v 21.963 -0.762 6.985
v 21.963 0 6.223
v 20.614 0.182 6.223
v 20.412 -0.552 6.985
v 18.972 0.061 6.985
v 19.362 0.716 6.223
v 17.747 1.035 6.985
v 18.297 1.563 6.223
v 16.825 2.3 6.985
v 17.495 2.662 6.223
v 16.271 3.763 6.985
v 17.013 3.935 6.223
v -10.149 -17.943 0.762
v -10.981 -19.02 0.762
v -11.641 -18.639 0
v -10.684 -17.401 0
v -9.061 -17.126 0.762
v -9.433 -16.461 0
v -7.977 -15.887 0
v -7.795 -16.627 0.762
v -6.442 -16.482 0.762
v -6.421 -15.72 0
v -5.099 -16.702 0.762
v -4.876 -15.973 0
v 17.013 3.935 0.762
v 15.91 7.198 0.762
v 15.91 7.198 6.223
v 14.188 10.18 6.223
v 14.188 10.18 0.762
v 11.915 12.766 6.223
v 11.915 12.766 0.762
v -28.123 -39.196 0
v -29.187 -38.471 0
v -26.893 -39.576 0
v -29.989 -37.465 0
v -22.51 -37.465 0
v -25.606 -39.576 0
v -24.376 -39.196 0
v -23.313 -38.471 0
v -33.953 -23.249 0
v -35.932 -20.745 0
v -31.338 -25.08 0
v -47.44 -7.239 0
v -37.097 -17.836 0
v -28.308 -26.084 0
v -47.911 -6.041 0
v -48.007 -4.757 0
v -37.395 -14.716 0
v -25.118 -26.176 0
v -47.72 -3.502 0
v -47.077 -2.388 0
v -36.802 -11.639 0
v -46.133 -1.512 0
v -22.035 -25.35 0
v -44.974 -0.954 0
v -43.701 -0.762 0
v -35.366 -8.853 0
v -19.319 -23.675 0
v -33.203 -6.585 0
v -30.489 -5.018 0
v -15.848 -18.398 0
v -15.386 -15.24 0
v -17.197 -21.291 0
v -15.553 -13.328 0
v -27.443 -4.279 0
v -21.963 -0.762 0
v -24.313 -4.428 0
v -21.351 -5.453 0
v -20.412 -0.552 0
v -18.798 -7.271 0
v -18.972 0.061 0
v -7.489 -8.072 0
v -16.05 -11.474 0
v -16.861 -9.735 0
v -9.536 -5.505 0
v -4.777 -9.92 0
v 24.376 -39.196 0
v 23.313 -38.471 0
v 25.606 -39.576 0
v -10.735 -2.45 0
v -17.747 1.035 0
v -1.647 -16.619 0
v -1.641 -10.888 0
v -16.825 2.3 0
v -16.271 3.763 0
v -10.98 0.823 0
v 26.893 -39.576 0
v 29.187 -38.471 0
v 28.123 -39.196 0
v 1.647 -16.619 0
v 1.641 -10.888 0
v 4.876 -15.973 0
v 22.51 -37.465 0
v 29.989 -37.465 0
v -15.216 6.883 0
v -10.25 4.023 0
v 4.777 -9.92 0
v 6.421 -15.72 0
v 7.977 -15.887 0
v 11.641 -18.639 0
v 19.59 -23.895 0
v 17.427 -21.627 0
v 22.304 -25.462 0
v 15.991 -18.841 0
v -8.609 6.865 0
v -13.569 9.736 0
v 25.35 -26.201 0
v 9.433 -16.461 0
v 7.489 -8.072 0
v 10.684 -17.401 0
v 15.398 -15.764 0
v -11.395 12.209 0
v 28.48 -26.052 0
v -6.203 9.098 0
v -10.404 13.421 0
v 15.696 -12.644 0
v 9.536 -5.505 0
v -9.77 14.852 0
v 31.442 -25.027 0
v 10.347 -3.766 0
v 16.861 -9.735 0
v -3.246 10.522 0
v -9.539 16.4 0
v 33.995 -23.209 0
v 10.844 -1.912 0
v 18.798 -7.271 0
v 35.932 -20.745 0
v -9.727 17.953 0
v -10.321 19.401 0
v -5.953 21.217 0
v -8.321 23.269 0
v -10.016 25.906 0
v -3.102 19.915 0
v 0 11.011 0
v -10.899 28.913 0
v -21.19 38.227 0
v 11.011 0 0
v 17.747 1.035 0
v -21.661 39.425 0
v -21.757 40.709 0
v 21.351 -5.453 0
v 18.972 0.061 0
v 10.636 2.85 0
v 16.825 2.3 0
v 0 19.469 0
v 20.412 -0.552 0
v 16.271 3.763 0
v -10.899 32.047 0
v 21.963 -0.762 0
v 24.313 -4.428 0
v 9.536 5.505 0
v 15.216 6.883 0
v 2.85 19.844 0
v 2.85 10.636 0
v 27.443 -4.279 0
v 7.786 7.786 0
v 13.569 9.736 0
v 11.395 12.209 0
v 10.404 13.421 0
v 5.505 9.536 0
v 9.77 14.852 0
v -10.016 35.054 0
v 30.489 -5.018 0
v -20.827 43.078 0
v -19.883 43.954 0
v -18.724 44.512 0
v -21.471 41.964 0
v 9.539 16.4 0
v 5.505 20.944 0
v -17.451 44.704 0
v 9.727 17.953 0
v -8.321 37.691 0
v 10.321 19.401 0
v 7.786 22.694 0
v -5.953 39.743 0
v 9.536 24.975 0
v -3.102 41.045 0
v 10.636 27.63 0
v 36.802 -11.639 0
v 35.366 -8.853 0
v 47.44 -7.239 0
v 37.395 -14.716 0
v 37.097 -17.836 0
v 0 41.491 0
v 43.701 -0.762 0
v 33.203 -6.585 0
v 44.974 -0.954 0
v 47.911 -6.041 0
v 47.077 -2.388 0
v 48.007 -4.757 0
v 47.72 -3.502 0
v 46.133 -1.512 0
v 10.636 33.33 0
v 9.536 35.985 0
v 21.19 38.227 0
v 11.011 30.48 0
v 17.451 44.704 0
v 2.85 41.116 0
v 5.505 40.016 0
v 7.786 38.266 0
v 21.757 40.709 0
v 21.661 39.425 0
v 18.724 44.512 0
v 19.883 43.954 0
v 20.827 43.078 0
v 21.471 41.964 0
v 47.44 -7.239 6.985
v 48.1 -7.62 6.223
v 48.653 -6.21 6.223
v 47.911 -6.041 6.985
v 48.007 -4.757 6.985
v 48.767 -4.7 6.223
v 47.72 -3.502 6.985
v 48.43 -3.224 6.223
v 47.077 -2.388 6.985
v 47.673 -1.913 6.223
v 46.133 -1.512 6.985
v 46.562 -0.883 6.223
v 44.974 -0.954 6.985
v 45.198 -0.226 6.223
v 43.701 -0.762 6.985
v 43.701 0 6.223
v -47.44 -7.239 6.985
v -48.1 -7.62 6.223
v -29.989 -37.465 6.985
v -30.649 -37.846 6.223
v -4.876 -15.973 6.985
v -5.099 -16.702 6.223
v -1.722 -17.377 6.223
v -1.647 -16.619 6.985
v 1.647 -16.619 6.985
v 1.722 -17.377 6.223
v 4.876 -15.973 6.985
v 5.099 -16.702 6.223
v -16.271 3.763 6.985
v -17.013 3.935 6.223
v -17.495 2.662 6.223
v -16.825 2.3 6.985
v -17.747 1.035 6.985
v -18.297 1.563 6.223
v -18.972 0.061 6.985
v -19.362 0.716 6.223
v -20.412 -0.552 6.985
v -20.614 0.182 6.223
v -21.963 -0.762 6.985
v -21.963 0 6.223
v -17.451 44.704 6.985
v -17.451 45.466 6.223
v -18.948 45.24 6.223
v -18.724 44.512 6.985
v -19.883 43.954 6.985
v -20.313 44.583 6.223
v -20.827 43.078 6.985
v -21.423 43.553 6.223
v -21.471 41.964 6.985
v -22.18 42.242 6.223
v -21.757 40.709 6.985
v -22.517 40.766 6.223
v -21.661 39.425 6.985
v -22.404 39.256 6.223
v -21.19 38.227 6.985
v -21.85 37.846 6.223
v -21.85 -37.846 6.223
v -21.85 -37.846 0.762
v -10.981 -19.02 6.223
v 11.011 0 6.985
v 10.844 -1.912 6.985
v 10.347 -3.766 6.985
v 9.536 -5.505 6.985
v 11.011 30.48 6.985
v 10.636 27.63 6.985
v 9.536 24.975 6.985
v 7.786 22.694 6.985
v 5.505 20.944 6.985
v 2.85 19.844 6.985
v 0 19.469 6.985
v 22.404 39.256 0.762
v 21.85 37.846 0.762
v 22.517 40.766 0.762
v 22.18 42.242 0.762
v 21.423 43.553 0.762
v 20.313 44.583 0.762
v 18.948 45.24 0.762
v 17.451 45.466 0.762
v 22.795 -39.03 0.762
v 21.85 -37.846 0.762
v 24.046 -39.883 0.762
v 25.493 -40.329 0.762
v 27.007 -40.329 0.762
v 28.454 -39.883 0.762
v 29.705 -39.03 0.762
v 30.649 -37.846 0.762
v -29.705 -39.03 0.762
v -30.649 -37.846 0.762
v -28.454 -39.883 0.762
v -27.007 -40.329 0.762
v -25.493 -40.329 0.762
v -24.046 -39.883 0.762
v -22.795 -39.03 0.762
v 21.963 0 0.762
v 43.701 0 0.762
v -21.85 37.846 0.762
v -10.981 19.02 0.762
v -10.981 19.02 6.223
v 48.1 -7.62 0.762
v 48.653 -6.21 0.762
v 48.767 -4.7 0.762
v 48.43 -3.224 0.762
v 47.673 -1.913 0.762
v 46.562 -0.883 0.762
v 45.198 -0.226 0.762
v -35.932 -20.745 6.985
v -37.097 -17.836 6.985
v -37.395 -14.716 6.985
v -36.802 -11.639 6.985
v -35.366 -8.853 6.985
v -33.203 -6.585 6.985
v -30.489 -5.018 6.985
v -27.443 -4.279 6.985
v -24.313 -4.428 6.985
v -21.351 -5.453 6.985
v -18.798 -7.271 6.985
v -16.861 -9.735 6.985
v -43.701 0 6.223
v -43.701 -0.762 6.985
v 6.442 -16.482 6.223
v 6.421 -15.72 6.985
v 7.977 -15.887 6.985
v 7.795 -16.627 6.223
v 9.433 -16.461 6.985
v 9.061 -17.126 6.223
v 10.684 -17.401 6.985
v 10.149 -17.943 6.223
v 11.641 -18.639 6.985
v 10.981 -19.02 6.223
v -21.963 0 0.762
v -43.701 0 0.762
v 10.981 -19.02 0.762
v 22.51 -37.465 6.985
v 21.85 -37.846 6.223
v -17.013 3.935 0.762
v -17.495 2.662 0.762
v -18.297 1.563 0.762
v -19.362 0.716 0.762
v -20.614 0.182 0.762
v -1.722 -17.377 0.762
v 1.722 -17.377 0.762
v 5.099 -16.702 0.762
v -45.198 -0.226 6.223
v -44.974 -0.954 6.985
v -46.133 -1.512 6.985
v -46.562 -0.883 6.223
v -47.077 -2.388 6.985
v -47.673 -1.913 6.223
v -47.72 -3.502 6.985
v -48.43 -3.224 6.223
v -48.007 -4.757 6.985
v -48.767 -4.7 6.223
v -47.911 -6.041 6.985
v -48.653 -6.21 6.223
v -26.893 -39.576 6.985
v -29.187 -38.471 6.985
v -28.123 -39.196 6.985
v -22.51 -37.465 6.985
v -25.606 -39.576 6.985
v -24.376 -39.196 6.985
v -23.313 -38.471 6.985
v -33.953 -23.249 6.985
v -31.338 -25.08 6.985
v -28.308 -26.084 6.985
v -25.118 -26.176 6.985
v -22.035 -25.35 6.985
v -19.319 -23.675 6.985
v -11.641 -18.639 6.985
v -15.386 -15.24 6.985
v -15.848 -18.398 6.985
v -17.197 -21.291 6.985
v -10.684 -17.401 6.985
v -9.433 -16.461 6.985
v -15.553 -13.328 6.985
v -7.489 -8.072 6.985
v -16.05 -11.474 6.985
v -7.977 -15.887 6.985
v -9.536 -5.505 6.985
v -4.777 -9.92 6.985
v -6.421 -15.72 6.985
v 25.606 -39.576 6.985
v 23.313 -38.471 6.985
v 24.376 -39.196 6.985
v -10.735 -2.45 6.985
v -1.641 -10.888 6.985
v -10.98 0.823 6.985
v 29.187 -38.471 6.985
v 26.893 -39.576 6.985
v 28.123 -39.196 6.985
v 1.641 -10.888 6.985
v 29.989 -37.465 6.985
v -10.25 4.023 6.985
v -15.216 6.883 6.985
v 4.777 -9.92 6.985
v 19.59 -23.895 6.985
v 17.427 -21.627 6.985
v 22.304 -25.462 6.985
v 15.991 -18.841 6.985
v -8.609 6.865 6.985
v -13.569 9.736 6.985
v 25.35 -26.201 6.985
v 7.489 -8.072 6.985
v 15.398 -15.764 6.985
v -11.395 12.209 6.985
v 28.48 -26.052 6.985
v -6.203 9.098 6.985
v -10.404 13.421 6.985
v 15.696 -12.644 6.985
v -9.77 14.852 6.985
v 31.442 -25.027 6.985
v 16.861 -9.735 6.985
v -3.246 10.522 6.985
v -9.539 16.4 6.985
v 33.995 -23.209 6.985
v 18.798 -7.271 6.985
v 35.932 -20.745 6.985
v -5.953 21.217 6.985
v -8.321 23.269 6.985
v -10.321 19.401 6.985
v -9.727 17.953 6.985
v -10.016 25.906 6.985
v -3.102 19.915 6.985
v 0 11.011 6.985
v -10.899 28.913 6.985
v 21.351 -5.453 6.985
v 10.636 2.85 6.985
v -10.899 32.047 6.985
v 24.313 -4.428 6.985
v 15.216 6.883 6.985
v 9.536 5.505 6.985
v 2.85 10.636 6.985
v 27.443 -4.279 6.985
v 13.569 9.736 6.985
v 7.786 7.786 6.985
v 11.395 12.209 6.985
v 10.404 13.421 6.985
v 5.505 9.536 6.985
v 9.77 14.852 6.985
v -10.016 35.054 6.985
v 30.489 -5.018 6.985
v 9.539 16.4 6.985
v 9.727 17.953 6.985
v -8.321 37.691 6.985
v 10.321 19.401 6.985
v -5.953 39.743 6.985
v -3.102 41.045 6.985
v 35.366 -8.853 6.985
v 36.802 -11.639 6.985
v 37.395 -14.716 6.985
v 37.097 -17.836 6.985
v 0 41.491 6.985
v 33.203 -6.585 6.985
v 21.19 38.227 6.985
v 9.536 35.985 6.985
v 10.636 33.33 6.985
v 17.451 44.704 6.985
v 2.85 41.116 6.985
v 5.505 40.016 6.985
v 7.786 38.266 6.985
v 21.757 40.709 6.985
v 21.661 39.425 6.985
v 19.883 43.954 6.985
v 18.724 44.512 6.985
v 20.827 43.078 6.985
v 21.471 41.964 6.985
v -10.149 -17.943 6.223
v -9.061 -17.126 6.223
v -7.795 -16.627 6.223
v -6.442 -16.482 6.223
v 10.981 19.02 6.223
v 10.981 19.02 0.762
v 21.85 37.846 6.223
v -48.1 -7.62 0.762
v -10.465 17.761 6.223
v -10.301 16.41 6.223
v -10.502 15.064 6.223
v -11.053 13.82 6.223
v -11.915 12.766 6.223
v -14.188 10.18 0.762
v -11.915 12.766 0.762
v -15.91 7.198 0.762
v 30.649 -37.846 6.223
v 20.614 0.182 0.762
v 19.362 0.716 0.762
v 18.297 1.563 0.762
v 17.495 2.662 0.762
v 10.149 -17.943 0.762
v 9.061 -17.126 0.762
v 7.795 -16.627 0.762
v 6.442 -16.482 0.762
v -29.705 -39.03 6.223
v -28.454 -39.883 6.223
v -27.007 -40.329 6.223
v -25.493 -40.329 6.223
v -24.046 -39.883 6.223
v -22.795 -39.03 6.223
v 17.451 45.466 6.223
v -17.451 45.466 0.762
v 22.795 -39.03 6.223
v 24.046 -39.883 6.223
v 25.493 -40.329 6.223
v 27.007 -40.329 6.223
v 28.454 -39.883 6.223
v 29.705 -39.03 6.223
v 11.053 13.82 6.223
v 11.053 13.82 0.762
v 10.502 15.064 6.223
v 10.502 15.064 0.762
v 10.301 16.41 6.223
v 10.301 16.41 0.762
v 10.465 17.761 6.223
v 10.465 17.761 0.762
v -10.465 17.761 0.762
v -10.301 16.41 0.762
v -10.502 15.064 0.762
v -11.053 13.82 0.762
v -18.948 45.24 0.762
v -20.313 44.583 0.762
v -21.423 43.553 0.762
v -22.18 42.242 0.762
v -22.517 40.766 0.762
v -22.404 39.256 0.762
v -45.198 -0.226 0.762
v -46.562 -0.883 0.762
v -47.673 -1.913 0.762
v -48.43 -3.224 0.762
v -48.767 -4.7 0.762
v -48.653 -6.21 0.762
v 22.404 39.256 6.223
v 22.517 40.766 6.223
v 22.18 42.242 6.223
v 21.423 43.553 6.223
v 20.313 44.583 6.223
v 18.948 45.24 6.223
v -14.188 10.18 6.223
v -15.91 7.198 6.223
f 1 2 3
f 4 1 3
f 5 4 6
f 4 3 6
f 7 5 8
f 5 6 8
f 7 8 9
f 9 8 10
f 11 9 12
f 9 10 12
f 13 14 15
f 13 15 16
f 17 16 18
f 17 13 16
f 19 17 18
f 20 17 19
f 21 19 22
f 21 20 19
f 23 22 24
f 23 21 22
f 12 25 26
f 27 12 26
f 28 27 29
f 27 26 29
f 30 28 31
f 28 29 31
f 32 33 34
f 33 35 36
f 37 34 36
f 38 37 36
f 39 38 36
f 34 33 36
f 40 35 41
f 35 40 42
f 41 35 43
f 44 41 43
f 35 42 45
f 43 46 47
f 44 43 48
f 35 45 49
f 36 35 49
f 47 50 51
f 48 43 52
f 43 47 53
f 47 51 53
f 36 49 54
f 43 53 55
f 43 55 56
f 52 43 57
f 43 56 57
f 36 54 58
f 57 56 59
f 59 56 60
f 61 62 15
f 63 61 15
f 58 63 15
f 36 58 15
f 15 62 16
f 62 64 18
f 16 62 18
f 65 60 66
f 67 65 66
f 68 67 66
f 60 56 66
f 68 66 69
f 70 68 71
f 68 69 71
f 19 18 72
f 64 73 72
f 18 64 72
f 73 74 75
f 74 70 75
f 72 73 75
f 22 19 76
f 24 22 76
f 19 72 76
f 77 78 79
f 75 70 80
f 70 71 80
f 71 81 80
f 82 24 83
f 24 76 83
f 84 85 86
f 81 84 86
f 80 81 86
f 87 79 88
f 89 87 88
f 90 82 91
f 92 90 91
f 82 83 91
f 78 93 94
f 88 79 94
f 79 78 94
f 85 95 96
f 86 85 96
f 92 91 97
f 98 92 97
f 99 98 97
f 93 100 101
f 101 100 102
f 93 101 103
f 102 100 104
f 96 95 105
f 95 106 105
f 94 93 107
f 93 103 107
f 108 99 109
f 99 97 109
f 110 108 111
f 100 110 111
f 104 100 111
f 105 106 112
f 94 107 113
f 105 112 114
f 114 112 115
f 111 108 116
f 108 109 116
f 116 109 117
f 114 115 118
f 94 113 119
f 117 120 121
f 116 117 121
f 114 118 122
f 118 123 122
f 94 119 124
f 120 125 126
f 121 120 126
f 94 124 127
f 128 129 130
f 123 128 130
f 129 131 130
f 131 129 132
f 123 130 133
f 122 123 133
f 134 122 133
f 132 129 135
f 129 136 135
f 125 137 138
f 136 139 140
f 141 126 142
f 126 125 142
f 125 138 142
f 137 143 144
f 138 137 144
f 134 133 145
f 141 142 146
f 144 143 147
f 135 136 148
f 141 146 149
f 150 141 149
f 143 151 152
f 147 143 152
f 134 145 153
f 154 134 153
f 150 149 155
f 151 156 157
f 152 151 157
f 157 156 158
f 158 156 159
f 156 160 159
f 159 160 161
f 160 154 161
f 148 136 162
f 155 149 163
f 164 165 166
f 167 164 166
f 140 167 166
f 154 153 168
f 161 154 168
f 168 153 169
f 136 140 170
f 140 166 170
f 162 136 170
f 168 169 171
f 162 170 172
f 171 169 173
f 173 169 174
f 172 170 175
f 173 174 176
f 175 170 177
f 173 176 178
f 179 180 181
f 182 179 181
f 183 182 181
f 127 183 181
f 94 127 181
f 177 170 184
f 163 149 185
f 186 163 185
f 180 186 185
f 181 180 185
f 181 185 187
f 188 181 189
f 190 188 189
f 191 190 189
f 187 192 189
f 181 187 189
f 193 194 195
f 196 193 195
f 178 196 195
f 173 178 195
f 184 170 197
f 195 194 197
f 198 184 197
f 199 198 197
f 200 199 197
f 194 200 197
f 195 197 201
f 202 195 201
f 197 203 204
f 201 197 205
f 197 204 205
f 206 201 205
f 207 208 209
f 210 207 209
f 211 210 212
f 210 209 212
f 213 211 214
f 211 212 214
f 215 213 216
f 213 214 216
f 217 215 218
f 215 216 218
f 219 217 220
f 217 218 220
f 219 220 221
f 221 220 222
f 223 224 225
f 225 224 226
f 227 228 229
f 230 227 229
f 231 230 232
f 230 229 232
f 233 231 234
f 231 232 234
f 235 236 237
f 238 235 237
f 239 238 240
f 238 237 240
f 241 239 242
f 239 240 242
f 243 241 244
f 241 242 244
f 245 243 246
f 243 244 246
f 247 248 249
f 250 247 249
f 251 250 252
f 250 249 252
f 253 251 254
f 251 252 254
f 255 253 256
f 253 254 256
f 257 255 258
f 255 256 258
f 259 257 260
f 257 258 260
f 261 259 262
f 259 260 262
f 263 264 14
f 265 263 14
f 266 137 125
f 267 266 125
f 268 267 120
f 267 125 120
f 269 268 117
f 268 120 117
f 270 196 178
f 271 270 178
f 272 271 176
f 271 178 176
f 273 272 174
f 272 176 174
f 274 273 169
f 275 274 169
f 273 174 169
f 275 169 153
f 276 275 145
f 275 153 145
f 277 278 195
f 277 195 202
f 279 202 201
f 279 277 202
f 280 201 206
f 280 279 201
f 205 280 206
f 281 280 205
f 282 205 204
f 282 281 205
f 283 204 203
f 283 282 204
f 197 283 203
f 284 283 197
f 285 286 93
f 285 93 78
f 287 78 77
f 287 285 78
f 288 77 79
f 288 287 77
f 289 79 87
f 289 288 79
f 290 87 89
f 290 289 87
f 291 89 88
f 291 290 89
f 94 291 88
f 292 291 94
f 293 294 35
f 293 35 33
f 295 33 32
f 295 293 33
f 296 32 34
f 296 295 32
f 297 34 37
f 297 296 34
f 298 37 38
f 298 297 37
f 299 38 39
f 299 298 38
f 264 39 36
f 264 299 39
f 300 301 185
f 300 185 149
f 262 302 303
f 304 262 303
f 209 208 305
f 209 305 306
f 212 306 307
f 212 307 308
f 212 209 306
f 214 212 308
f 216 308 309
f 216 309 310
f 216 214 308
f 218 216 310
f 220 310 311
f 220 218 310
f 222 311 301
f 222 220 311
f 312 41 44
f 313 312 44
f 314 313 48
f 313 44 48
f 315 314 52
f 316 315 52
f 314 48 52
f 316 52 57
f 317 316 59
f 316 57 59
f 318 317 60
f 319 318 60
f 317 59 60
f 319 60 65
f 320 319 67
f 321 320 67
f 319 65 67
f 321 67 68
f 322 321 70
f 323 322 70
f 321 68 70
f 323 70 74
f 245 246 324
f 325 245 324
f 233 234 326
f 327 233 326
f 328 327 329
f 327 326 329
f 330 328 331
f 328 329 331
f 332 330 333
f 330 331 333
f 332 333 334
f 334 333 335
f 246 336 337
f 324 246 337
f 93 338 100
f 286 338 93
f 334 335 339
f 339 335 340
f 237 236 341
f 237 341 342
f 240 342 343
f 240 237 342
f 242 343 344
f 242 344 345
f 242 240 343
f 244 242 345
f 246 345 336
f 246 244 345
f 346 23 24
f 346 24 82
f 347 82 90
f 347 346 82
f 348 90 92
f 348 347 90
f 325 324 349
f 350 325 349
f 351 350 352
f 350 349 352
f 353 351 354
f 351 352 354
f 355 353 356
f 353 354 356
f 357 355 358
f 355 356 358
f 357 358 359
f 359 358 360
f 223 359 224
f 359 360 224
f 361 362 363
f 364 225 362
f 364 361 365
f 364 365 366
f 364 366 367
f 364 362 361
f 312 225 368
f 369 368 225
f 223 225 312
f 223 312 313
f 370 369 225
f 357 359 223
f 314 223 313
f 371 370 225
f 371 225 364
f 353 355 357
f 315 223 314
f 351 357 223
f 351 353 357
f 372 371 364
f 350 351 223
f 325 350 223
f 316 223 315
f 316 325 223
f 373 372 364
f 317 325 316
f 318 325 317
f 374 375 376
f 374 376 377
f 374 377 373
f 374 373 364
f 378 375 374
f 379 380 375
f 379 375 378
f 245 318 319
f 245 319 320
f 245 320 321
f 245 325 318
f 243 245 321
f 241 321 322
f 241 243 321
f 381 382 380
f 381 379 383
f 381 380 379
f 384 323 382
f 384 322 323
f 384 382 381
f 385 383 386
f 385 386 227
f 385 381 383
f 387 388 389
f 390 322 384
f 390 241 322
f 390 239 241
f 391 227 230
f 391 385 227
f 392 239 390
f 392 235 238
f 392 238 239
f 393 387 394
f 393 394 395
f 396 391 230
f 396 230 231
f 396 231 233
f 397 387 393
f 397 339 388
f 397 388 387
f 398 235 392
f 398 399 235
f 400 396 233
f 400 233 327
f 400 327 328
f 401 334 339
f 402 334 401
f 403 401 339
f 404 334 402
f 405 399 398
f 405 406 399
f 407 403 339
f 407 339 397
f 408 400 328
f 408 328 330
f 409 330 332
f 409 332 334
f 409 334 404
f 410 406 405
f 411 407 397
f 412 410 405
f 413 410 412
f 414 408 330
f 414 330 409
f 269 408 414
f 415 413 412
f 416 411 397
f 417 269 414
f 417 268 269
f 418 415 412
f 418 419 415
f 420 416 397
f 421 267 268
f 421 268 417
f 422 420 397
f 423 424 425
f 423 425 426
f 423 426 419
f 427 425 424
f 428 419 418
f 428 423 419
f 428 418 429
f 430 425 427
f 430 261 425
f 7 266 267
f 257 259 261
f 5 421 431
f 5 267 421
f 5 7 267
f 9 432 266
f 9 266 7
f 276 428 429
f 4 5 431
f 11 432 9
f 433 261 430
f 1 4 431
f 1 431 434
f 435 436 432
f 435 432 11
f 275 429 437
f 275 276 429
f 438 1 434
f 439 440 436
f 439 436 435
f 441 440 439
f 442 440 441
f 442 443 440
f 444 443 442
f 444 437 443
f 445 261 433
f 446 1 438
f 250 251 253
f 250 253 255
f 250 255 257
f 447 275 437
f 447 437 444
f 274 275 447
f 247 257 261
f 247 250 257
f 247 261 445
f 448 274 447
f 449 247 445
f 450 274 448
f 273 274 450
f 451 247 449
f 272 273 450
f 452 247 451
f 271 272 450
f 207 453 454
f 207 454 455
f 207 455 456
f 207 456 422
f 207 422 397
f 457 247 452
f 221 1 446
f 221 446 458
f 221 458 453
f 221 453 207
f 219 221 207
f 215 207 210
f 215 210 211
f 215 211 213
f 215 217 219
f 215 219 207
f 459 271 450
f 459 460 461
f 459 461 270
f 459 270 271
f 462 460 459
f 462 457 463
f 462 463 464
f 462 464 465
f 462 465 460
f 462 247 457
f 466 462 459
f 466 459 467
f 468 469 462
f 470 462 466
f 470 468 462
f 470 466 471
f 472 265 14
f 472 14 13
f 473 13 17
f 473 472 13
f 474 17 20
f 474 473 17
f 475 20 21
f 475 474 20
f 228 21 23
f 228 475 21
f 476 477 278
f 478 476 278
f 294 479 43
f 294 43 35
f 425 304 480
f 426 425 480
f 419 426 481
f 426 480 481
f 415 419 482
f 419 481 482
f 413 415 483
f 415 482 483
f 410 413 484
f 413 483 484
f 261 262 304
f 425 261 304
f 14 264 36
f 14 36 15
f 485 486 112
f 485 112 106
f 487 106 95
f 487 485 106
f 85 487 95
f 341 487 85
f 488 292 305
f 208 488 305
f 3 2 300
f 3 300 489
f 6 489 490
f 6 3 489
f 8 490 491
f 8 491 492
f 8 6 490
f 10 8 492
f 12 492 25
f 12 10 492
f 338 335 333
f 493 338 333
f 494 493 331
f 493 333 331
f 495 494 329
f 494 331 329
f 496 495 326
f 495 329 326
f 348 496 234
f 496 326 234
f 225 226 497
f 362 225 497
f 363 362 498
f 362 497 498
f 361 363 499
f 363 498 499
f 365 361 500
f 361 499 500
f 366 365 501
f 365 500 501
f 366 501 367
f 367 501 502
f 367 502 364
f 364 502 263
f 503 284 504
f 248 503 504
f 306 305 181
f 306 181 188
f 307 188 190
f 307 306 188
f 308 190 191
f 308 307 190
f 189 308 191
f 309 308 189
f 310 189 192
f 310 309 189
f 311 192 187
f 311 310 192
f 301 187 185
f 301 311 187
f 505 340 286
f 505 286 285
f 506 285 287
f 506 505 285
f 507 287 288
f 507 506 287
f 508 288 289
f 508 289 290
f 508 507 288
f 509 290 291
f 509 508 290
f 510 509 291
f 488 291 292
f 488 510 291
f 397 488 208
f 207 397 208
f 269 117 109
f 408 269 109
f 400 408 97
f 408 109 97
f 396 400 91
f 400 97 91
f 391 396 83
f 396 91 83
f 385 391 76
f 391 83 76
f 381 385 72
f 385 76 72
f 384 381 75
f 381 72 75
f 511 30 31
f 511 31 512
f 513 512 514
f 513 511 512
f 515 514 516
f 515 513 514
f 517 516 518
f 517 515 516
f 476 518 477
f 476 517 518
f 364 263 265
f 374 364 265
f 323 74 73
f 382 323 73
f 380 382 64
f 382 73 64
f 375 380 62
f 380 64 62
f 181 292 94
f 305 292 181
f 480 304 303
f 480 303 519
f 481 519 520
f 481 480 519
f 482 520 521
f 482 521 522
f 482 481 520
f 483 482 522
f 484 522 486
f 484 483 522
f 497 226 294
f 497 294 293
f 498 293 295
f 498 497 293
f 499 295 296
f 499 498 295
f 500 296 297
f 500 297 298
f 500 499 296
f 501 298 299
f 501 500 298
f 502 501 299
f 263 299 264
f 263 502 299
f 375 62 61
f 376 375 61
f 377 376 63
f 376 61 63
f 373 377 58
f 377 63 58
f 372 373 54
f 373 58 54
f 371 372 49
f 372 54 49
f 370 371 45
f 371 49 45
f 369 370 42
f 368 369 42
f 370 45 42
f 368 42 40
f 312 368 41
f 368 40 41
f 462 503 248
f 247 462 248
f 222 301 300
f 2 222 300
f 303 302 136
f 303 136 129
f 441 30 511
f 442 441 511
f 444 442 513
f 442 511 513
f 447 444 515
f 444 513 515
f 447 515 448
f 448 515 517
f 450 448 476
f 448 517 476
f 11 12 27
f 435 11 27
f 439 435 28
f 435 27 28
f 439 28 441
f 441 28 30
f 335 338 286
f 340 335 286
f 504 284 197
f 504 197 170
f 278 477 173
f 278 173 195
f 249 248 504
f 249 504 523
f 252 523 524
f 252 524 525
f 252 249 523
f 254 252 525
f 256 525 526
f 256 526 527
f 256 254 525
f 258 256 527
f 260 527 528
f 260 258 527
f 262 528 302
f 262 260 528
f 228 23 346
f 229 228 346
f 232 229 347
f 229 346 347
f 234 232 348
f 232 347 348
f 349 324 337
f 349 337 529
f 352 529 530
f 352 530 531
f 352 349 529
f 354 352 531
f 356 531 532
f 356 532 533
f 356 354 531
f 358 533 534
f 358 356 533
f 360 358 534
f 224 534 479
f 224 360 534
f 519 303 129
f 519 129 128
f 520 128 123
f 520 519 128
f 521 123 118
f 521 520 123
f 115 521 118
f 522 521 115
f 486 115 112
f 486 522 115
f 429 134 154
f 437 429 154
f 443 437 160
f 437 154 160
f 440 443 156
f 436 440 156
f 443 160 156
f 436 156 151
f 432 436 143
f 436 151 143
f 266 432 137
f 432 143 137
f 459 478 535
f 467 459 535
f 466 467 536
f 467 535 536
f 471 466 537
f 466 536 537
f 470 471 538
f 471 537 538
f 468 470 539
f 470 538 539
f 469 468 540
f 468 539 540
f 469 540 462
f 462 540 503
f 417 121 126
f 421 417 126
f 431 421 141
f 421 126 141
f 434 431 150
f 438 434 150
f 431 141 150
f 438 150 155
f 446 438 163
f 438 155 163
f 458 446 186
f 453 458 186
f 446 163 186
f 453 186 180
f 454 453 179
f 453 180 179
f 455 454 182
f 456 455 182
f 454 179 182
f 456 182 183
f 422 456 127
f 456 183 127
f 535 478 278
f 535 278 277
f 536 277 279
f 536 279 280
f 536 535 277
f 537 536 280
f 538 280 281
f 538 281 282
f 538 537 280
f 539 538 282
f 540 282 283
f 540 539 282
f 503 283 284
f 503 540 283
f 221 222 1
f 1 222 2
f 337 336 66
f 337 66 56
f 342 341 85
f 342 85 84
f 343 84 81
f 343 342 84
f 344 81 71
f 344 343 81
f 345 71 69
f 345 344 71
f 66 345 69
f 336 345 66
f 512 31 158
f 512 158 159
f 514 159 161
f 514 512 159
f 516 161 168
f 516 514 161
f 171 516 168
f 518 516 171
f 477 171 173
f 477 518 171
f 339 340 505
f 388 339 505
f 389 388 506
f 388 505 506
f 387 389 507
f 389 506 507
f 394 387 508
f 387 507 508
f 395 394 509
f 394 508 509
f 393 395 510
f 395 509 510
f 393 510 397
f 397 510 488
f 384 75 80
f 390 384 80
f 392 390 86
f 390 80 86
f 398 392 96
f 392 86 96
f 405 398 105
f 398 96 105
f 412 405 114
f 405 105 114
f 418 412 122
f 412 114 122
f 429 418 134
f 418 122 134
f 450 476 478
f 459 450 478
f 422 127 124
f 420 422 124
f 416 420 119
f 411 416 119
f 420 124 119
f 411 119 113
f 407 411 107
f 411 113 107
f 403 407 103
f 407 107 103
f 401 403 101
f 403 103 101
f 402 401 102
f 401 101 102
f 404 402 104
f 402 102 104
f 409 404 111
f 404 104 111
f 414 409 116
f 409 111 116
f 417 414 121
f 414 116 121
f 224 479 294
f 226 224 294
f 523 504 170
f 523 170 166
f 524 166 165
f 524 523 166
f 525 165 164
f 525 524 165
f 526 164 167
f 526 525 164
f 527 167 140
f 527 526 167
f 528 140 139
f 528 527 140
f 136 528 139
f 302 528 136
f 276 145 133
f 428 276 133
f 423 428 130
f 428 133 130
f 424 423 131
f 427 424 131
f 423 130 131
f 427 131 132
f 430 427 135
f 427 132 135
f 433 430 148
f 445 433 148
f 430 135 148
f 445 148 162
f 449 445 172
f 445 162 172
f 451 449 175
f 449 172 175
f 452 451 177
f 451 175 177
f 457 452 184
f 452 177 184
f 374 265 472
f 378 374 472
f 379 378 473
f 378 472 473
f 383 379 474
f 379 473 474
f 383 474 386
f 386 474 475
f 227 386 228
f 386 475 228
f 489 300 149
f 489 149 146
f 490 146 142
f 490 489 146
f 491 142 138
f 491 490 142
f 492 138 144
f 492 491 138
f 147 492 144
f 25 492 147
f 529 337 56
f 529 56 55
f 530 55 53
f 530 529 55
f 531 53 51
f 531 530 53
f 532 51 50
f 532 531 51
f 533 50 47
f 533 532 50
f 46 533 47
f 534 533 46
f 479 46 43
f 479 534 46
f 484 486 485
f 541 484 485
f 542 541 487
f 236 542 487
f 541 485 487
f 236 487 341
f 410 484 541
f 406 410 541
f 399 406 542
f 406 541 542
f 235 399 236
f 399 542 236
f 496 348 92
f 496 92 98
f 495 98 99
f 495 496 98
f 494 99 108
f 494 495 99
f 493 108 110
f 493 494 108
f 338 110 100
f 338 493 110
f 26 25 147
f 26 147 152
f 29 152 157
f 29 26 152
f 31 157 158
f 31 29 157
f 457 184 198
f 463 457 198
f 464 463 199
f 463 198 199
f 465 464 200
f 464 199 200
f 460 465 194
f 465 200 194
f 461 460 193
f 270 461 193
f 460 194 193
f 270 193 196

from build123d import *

# Parameters (mm, degrees)
F1_DEPTH = 6.985
F2_R     = 5.08
F3_SIZE  = 0.762


with BuildPart() as f1:
    # F0 (on Top) → F1 (new body)
    with BuildSketch(Plane.XY):
        with BuildLine():
            ThreePointArc((-7.41045, 12.8352759069), (-3.8359311856, 14.3158900788), (0, 14.8209))
            Line((0, 14.8209), (0, 17.4625))
            ThreePointArc((0, 17.4625), (-4.5196275751, 16.8674797416), (-8.73125, 15.1229686136))
            Line((-8.73125, 15.1229686136), (-7.41045, 12.8352759069))
        make_face()
        with BuildLine():
            Line((0, 17.4625), (0, 14.8209))
            ThreePointArc((0, 14.8209), (3.8359311856, 14.3158900788), (7.41045, 12.8352759069))
            Line((7.41045, 12.8352759069), (8.73125, 15.1229686136))
            ThreePointArc((8.73125, 15.1229686136), (4.5196275751, 16.8674797416), (0, 17.4625))
        make_face()
        with BuildLine():
            ThreePointArc((14.8209, 0), (14.3158900788, -3.8359311856), (12.8352759069, -7.41045))
            Line((12.8352759069, -7.41045), (15.1229686136, -8.73125))
            ThreePointArc((15.1229686136, -8.73125), (16.8674797416, -4.5196275751), (17.4625, 0))
            Line((17.4625, 0), (14.8209, 0))
        make_face()
        with BuildLine():
            Line((15.1229686136, -8.73125), (12.8352759069, -7.41045))
            ThreePointArc((12.8352759069, -7.41045), (10.4799588933, -10.4799588933), (7.41045, -12.8352759069))
            Line((7.41045, -12.8352759069), (8.73125, -15.1229686136))
            ThreePointArc((8.73125, -15.1229686136), (12.3478521665, -12.3478521665), (15.1229686136, -8.73125))
        make_face()
        with BuildLine():
            ThreePointArc((-7.41045, -12.8352759069), (-10.4799588933, -10.4799588933), (-12.8352759069, -7.41045))
            Line((-12.8352759069, -7.41045), (-15.1229686136, -8.73125))
            ThreePointArc((-15.1229686136, -8.73125), (-12.3478521665, -12.3478521665), (-8.73125, -15.1229686136))
            Line((-8.73125, -15.1229686136), (-7.41045, -12.8352759069))
        make_face()
        with BuildLine():
            Line((-15.1229686136, -8.73125), (-12.8352759069, -7.41045))
            ThreePointArc((-12.8352759069, -7.41045), (-14.3158900788, -3.8359311856), (-14.8209, 0))
            Line((-14.8209, 0), (-17.4625, 0))
            ThreePointArc((-17.4625, 0), (-16.8674797416, -4.5196275751), (-15.1229686136, -8.73125))
        make_face()
        with BuildLine():
            ThreePointArc((-8.73125, 15.1229686136), (-4.5196275751, 16.8674797416), (0, 17.4625))
            Line((0, 17.4625), (0, 19.4691))
            ThreePointArc((0, 19.4691), (-11.0109, 30.48), (0, 41.4909))
            Line((0, 41.4909), (0, 45.466))
            Line((0, 45.466), (-26.249807339, 45.466))
            Line((-26.249807339, 45.466), (-8.73125, 15.1229686136))
        make_face()
        with BuildLine():
            Line((0, 19.4691), (0, 17.4625))
            ThreePointArc((0, 17.4625), (4.5196275751, 16.8674797416), (8.73125, 15.1229686136))
            Line((8.73125, 15.1229686136), (26.249807339, 45.466))
            Line((26.249807339, 45.466), (0, 45.466))
            Line((0, 45.466), (0, 41.4909))
            ThreePointArc((0, 41.4909), (7.785882057, 38.265882057), (11.0109, 30.48))
            ThreePointArc((11.0109, 30.48), (7.785882057, 22.694117943), (0, 19.4691))
        make_face()
        with BuildLine():
            Line((8.73125, 15.1229686136), (7.41045, 12.8352759069))
            ThreePointArc((7.41045, 12.8352759069), (12.8352759069, 7.41045), (14.8209, 0))
            Line((14.8209, 0), (17.4625, 0))
            ThreePointArc((17.4625, 0), (15.1229686136, 8.73125), (8.73125, 15.1229686136))
        make_face()
        with BuildLine():
            ThreePointArc((-14.8209, 0), (-12.8352759069, 7.41045), (-7.41045, 12.8352759069))
            Line((-7.41045, 12.8352759069), (-8.73125, 15.1229686136))
            ThreePointArc((-8.73125, 15.1229686136), (-15.1229686136, 8.73125), (-17.4625, 0))
            Line((-17.4625, 0), (-14.8209, 0))
        make_face()
        with BuildLine():
            ThreePointArc((17.4625, 0), (16.8674797416, -4.5196275751), (15.1229686136, -8.73125))
            Line((15.1229686136, -8.73125), (16.8607351888, -9.73455))
            ThreePointArc((16.8607351888, -9.73455), (29.2462849311, -4.6042873193), (37.4073543073, -15.24))
            ThreePointArc((37.4073543073, -15.24), (37.032166988, -18.0898306237), (35.9321734259, -20.74545))
            Line((35.9321734259, -20.74545), (39.3747110085, -22.733))
            Line((39.3747110085, -22.733), (52.499614678, 0))
            Line((52.499614678, 0), (17.4625, 0))
        make_face()
        with BuildLine():
            Line((16.8607351888, -9.73455), (15.1229686136, -8.73125))
            ThreePointArc((15.1229686136, -8.73125), (12.3478521665, -12.3478521665), (8.73125, -15.1229686136))
            Line((8.73125, -15.1229686136), (26.249807339, -45.466))
            Line((26.249807339, -45.466), (39.3747110085, -22.733))
            Line((39.3747110085, -22.733), (35.9321734259, -20.74545))
            ThreePointArc((35.9321734259, -20.74545), (20.8910043073, -24.7757191185), (16.8607351888, -9.73455))
        make_face()
        with BuildLine():
            Line((8.73125, -15.1229686136), (7.41045, -12.8352759069))
            ThreePointArc((7.41045, -12.8352759069), (0, -14.8209), (-7.41045, -12.8352759069))
            Line((-7.41045, -12.8352759069), (-8.73125, -15.1229686136))
            ThreePointArc((-8.73125, -15.1229686136), (0, -17.4625), (8.73125, -15.1229686136))
        make_face()
        with BuildLine():
            ThreePointArc((-8.73125, -15.1229686136), (-12.3478521665, -12.3478521665), (-15.1229686136, -8.73125))
            Line((-15.1229686136, -8.73125), (-16.8607351888, -9.73455))
            ThreePointArc((-16.8607351888, -9.73455), (-15.7607416267, -12.3901693763), (-15.3855543073, -15.24))
            ThreePointArc((-15.3855543073, -15.24), (-23.5466236836, -25.8757126807), (-35.9321734259, -20.74545))
            Line((-35.9321734259, -20.74545), (-39.3747110085, -22.733))
            Line((-39.3747110085, -22.733), (-26.249807339, -45.466))
            Line((-26.249807339, -45.466), (-8.73125, -15.1229686136))
        make_face()
        with BuildLine():
            Line((-16.8607351888, -9.73455), (-15.1229686136, -8.73125))
            ThreePointArc((-15.1229686136, -8.73125), (-16.8674797416, -4.5196275751), (-17.4625, 0))
            Line((-17.4625, 0), (-52.499614678, 0))
            Line((-52.499614678, 0), (-39.3747110085, -22.733))
            Line((-39.3747110085, -22.733), (-35.9321734259, -20.74545))
            ThreePointArc((-35.9321734259, -20.74545), (-31.9019043073, -5.7042808815), (-16.8607351888, -9.73455))
        make_face()
        with BuildLine():
            ThreePointArc((-9.5357191185, -5.50545), (-9.5357191185, 5.50545), (0, 11.0109))
            Line((0, 11.0109), (0, 14.8209))
            ThreePointArc((0, 14.8209), (-3.8359311856, 14.3158900788), (-7.41045, 12.8352759069))
            ThreePointArc((-7.41045, 12.8352759069), (-12.8352759069, 7.41045), (-14.8209, 0))
            ThreePointArc((-14.8209, 0), (-14.3158900788, -3.8359311856), (-12.8352759069, -7.41045))
            Line((-12.8352759069, -7.41045), (-9.5357191185, -5.50545))
        make_face()
        with BuildLine():
            ThreePointArc((0, 11.0109), (7.785882057, 7.785882057), (11.0109, 0))
            ThreePointArc((11.0109, 0), (10.6357126807, -2.8498306237), (9.5357191185, -5.50545))
            Line((9.5357191185, -5.50545), (12.8352759069, -7.41045))
            ThreePointArc((12.8352759069, -7.41045), (14.3158900788, -3.8359311856), (14.8209, 0))
            ThreePointArc((14.8209, 0), (12.8352759069, 7.41045), (7.41045, 12.8352759069))
            ThreePointArc((7.41045, 12.8352759069), (3.8359311856, 14.3158900788), (0, 14.8209))
            Line((0, 14.8209), (0, 11.0109))
        make_face()
        with BuildLine():
            Line((12.8352759069, -7.41045), (9.5357191185, -5.50545))
            ThreePointArc((9.5357191185, -5.50545), (0, -11.0109), (-9.5357191185, -5.50545))
            Line((-9.5357191185, -5.50545), (-12.8352759069, -7.41045))
            ThreePointArc((-12.8352759069, -7.41045), (-10.4799588933, -10.4799588933), (-7.41045, -12.8352759069))
            ThreePointArc((-7.41045, -12.8352759069), (0, -14.8209), (7.41045, -12.8352759069))
            ThreePointArc((7.41045, -12.8352759069), (10.4799588933, -10.4799588933), (12.8352759069, -7.41045))
        make_face()
    extrude(amount=F1_DEPTH)

    # F2
    f2_edges = [f1.edges().sort_by_distance(p)[0] for p in [
        (8.73125, -15.122969, 3.4925),
        (26.249807, -45.466, 3.4925),
        (52.499615, 0, 3.4925),
        (17.4625, 0, 3.4925),
        (8.73125, 15.122969, 3.4925),
        (26.249807, 45.466, 3.4925),
        (-26.249807, 45.466, 3.4925),
        (-8.73125, 15.122969, 3.4925),
        (-17.4625, 0, 3.4925),
        (-52.499615, 0, 3.4925),
        (-26.249807, -45.466, 3.4925),
        (-8.73125, -15.122969, 3.4925),
    ]]
    fillet(f2_edges, radius=F2_R)

    # F3
    f3_edges = [f1.edges().sort_by_distance(p)[0] for p in [
        (-32.831722, 0, 6.985),
        (-16.415861, 28.433106, 6.985),
        (32.831722, 0, 6.985),
        (16.415861, 28.433106, 6.985),
        (0, 45.466, 6.985),
        (-39.374711, -22.733, 6.985),
        (39.374711, -22.733, 6.985),
        (16.415861, -28.433106, 6.985),
        (-16.415861, -28.433106, 6.985),
        (-16.415861, -28.433106, 0),
        (-32.831722, 0, 0),
        (-16.415861, 28.433106, 0),
        (16.415861, 28.433106, 0),
        (32.831722, 0, 0),
        (16.415861, -28.433106, 0),
        (39.374711, -22.733, 0),
        (0, 45.466, 0),
        (-39.374711, -22.733, 0),
        (8.444714, -16.834073, 0),
        (26.249807, -40.386, 0),
        (0, -17.4625, 0),
        (-8.444714, -16.834073, 0),
        (48.100206, -2.54, 0),
        (-26.249807, -40.386, 0),
        (18.801092, 1.1037, 0),
        (15.122969, 8.73125, 0),
        (-48.100206, -2.54, 0),
        (10.356378, 15.730373, 0),
        (-18.801092, 1.1037, 0),
        (21.850398, 42.926, 0),
        (-15.122969, 8.73125, 0),
        (-10.356378, 15.730373, 0),
        (-21.850398, 42.926, 0),
        (8.444714, -16.834073, 6.985),
        (26.249807, -40.386, 6.985),
        (0, -17.4625, 6.985),
        (-8.444714, -16.834073, 6.985),
        (48.100206, -2.54, 6.985),
        (-26.249807, -40.386, 6.985),
        (18.801092, 1.1037, 6.985),
        (15.122969, 8.73125, 6.985),
        (-48.100206, -2.54, 6.985),
        (10.356378, 15.730373, 6.985),
        (-18.801092, 1.1037, 6.985),
        (21.850398, 42.926, 6.985),
        (-15.122969, 8.73125, 6.985),
        (-10.356378, 15.730373, 6.985),
        (-21.850398, 42.926, 6.985),
    ]]
    chamfer(f3_edges, length=F3_SIZE)


solid = f1.part
